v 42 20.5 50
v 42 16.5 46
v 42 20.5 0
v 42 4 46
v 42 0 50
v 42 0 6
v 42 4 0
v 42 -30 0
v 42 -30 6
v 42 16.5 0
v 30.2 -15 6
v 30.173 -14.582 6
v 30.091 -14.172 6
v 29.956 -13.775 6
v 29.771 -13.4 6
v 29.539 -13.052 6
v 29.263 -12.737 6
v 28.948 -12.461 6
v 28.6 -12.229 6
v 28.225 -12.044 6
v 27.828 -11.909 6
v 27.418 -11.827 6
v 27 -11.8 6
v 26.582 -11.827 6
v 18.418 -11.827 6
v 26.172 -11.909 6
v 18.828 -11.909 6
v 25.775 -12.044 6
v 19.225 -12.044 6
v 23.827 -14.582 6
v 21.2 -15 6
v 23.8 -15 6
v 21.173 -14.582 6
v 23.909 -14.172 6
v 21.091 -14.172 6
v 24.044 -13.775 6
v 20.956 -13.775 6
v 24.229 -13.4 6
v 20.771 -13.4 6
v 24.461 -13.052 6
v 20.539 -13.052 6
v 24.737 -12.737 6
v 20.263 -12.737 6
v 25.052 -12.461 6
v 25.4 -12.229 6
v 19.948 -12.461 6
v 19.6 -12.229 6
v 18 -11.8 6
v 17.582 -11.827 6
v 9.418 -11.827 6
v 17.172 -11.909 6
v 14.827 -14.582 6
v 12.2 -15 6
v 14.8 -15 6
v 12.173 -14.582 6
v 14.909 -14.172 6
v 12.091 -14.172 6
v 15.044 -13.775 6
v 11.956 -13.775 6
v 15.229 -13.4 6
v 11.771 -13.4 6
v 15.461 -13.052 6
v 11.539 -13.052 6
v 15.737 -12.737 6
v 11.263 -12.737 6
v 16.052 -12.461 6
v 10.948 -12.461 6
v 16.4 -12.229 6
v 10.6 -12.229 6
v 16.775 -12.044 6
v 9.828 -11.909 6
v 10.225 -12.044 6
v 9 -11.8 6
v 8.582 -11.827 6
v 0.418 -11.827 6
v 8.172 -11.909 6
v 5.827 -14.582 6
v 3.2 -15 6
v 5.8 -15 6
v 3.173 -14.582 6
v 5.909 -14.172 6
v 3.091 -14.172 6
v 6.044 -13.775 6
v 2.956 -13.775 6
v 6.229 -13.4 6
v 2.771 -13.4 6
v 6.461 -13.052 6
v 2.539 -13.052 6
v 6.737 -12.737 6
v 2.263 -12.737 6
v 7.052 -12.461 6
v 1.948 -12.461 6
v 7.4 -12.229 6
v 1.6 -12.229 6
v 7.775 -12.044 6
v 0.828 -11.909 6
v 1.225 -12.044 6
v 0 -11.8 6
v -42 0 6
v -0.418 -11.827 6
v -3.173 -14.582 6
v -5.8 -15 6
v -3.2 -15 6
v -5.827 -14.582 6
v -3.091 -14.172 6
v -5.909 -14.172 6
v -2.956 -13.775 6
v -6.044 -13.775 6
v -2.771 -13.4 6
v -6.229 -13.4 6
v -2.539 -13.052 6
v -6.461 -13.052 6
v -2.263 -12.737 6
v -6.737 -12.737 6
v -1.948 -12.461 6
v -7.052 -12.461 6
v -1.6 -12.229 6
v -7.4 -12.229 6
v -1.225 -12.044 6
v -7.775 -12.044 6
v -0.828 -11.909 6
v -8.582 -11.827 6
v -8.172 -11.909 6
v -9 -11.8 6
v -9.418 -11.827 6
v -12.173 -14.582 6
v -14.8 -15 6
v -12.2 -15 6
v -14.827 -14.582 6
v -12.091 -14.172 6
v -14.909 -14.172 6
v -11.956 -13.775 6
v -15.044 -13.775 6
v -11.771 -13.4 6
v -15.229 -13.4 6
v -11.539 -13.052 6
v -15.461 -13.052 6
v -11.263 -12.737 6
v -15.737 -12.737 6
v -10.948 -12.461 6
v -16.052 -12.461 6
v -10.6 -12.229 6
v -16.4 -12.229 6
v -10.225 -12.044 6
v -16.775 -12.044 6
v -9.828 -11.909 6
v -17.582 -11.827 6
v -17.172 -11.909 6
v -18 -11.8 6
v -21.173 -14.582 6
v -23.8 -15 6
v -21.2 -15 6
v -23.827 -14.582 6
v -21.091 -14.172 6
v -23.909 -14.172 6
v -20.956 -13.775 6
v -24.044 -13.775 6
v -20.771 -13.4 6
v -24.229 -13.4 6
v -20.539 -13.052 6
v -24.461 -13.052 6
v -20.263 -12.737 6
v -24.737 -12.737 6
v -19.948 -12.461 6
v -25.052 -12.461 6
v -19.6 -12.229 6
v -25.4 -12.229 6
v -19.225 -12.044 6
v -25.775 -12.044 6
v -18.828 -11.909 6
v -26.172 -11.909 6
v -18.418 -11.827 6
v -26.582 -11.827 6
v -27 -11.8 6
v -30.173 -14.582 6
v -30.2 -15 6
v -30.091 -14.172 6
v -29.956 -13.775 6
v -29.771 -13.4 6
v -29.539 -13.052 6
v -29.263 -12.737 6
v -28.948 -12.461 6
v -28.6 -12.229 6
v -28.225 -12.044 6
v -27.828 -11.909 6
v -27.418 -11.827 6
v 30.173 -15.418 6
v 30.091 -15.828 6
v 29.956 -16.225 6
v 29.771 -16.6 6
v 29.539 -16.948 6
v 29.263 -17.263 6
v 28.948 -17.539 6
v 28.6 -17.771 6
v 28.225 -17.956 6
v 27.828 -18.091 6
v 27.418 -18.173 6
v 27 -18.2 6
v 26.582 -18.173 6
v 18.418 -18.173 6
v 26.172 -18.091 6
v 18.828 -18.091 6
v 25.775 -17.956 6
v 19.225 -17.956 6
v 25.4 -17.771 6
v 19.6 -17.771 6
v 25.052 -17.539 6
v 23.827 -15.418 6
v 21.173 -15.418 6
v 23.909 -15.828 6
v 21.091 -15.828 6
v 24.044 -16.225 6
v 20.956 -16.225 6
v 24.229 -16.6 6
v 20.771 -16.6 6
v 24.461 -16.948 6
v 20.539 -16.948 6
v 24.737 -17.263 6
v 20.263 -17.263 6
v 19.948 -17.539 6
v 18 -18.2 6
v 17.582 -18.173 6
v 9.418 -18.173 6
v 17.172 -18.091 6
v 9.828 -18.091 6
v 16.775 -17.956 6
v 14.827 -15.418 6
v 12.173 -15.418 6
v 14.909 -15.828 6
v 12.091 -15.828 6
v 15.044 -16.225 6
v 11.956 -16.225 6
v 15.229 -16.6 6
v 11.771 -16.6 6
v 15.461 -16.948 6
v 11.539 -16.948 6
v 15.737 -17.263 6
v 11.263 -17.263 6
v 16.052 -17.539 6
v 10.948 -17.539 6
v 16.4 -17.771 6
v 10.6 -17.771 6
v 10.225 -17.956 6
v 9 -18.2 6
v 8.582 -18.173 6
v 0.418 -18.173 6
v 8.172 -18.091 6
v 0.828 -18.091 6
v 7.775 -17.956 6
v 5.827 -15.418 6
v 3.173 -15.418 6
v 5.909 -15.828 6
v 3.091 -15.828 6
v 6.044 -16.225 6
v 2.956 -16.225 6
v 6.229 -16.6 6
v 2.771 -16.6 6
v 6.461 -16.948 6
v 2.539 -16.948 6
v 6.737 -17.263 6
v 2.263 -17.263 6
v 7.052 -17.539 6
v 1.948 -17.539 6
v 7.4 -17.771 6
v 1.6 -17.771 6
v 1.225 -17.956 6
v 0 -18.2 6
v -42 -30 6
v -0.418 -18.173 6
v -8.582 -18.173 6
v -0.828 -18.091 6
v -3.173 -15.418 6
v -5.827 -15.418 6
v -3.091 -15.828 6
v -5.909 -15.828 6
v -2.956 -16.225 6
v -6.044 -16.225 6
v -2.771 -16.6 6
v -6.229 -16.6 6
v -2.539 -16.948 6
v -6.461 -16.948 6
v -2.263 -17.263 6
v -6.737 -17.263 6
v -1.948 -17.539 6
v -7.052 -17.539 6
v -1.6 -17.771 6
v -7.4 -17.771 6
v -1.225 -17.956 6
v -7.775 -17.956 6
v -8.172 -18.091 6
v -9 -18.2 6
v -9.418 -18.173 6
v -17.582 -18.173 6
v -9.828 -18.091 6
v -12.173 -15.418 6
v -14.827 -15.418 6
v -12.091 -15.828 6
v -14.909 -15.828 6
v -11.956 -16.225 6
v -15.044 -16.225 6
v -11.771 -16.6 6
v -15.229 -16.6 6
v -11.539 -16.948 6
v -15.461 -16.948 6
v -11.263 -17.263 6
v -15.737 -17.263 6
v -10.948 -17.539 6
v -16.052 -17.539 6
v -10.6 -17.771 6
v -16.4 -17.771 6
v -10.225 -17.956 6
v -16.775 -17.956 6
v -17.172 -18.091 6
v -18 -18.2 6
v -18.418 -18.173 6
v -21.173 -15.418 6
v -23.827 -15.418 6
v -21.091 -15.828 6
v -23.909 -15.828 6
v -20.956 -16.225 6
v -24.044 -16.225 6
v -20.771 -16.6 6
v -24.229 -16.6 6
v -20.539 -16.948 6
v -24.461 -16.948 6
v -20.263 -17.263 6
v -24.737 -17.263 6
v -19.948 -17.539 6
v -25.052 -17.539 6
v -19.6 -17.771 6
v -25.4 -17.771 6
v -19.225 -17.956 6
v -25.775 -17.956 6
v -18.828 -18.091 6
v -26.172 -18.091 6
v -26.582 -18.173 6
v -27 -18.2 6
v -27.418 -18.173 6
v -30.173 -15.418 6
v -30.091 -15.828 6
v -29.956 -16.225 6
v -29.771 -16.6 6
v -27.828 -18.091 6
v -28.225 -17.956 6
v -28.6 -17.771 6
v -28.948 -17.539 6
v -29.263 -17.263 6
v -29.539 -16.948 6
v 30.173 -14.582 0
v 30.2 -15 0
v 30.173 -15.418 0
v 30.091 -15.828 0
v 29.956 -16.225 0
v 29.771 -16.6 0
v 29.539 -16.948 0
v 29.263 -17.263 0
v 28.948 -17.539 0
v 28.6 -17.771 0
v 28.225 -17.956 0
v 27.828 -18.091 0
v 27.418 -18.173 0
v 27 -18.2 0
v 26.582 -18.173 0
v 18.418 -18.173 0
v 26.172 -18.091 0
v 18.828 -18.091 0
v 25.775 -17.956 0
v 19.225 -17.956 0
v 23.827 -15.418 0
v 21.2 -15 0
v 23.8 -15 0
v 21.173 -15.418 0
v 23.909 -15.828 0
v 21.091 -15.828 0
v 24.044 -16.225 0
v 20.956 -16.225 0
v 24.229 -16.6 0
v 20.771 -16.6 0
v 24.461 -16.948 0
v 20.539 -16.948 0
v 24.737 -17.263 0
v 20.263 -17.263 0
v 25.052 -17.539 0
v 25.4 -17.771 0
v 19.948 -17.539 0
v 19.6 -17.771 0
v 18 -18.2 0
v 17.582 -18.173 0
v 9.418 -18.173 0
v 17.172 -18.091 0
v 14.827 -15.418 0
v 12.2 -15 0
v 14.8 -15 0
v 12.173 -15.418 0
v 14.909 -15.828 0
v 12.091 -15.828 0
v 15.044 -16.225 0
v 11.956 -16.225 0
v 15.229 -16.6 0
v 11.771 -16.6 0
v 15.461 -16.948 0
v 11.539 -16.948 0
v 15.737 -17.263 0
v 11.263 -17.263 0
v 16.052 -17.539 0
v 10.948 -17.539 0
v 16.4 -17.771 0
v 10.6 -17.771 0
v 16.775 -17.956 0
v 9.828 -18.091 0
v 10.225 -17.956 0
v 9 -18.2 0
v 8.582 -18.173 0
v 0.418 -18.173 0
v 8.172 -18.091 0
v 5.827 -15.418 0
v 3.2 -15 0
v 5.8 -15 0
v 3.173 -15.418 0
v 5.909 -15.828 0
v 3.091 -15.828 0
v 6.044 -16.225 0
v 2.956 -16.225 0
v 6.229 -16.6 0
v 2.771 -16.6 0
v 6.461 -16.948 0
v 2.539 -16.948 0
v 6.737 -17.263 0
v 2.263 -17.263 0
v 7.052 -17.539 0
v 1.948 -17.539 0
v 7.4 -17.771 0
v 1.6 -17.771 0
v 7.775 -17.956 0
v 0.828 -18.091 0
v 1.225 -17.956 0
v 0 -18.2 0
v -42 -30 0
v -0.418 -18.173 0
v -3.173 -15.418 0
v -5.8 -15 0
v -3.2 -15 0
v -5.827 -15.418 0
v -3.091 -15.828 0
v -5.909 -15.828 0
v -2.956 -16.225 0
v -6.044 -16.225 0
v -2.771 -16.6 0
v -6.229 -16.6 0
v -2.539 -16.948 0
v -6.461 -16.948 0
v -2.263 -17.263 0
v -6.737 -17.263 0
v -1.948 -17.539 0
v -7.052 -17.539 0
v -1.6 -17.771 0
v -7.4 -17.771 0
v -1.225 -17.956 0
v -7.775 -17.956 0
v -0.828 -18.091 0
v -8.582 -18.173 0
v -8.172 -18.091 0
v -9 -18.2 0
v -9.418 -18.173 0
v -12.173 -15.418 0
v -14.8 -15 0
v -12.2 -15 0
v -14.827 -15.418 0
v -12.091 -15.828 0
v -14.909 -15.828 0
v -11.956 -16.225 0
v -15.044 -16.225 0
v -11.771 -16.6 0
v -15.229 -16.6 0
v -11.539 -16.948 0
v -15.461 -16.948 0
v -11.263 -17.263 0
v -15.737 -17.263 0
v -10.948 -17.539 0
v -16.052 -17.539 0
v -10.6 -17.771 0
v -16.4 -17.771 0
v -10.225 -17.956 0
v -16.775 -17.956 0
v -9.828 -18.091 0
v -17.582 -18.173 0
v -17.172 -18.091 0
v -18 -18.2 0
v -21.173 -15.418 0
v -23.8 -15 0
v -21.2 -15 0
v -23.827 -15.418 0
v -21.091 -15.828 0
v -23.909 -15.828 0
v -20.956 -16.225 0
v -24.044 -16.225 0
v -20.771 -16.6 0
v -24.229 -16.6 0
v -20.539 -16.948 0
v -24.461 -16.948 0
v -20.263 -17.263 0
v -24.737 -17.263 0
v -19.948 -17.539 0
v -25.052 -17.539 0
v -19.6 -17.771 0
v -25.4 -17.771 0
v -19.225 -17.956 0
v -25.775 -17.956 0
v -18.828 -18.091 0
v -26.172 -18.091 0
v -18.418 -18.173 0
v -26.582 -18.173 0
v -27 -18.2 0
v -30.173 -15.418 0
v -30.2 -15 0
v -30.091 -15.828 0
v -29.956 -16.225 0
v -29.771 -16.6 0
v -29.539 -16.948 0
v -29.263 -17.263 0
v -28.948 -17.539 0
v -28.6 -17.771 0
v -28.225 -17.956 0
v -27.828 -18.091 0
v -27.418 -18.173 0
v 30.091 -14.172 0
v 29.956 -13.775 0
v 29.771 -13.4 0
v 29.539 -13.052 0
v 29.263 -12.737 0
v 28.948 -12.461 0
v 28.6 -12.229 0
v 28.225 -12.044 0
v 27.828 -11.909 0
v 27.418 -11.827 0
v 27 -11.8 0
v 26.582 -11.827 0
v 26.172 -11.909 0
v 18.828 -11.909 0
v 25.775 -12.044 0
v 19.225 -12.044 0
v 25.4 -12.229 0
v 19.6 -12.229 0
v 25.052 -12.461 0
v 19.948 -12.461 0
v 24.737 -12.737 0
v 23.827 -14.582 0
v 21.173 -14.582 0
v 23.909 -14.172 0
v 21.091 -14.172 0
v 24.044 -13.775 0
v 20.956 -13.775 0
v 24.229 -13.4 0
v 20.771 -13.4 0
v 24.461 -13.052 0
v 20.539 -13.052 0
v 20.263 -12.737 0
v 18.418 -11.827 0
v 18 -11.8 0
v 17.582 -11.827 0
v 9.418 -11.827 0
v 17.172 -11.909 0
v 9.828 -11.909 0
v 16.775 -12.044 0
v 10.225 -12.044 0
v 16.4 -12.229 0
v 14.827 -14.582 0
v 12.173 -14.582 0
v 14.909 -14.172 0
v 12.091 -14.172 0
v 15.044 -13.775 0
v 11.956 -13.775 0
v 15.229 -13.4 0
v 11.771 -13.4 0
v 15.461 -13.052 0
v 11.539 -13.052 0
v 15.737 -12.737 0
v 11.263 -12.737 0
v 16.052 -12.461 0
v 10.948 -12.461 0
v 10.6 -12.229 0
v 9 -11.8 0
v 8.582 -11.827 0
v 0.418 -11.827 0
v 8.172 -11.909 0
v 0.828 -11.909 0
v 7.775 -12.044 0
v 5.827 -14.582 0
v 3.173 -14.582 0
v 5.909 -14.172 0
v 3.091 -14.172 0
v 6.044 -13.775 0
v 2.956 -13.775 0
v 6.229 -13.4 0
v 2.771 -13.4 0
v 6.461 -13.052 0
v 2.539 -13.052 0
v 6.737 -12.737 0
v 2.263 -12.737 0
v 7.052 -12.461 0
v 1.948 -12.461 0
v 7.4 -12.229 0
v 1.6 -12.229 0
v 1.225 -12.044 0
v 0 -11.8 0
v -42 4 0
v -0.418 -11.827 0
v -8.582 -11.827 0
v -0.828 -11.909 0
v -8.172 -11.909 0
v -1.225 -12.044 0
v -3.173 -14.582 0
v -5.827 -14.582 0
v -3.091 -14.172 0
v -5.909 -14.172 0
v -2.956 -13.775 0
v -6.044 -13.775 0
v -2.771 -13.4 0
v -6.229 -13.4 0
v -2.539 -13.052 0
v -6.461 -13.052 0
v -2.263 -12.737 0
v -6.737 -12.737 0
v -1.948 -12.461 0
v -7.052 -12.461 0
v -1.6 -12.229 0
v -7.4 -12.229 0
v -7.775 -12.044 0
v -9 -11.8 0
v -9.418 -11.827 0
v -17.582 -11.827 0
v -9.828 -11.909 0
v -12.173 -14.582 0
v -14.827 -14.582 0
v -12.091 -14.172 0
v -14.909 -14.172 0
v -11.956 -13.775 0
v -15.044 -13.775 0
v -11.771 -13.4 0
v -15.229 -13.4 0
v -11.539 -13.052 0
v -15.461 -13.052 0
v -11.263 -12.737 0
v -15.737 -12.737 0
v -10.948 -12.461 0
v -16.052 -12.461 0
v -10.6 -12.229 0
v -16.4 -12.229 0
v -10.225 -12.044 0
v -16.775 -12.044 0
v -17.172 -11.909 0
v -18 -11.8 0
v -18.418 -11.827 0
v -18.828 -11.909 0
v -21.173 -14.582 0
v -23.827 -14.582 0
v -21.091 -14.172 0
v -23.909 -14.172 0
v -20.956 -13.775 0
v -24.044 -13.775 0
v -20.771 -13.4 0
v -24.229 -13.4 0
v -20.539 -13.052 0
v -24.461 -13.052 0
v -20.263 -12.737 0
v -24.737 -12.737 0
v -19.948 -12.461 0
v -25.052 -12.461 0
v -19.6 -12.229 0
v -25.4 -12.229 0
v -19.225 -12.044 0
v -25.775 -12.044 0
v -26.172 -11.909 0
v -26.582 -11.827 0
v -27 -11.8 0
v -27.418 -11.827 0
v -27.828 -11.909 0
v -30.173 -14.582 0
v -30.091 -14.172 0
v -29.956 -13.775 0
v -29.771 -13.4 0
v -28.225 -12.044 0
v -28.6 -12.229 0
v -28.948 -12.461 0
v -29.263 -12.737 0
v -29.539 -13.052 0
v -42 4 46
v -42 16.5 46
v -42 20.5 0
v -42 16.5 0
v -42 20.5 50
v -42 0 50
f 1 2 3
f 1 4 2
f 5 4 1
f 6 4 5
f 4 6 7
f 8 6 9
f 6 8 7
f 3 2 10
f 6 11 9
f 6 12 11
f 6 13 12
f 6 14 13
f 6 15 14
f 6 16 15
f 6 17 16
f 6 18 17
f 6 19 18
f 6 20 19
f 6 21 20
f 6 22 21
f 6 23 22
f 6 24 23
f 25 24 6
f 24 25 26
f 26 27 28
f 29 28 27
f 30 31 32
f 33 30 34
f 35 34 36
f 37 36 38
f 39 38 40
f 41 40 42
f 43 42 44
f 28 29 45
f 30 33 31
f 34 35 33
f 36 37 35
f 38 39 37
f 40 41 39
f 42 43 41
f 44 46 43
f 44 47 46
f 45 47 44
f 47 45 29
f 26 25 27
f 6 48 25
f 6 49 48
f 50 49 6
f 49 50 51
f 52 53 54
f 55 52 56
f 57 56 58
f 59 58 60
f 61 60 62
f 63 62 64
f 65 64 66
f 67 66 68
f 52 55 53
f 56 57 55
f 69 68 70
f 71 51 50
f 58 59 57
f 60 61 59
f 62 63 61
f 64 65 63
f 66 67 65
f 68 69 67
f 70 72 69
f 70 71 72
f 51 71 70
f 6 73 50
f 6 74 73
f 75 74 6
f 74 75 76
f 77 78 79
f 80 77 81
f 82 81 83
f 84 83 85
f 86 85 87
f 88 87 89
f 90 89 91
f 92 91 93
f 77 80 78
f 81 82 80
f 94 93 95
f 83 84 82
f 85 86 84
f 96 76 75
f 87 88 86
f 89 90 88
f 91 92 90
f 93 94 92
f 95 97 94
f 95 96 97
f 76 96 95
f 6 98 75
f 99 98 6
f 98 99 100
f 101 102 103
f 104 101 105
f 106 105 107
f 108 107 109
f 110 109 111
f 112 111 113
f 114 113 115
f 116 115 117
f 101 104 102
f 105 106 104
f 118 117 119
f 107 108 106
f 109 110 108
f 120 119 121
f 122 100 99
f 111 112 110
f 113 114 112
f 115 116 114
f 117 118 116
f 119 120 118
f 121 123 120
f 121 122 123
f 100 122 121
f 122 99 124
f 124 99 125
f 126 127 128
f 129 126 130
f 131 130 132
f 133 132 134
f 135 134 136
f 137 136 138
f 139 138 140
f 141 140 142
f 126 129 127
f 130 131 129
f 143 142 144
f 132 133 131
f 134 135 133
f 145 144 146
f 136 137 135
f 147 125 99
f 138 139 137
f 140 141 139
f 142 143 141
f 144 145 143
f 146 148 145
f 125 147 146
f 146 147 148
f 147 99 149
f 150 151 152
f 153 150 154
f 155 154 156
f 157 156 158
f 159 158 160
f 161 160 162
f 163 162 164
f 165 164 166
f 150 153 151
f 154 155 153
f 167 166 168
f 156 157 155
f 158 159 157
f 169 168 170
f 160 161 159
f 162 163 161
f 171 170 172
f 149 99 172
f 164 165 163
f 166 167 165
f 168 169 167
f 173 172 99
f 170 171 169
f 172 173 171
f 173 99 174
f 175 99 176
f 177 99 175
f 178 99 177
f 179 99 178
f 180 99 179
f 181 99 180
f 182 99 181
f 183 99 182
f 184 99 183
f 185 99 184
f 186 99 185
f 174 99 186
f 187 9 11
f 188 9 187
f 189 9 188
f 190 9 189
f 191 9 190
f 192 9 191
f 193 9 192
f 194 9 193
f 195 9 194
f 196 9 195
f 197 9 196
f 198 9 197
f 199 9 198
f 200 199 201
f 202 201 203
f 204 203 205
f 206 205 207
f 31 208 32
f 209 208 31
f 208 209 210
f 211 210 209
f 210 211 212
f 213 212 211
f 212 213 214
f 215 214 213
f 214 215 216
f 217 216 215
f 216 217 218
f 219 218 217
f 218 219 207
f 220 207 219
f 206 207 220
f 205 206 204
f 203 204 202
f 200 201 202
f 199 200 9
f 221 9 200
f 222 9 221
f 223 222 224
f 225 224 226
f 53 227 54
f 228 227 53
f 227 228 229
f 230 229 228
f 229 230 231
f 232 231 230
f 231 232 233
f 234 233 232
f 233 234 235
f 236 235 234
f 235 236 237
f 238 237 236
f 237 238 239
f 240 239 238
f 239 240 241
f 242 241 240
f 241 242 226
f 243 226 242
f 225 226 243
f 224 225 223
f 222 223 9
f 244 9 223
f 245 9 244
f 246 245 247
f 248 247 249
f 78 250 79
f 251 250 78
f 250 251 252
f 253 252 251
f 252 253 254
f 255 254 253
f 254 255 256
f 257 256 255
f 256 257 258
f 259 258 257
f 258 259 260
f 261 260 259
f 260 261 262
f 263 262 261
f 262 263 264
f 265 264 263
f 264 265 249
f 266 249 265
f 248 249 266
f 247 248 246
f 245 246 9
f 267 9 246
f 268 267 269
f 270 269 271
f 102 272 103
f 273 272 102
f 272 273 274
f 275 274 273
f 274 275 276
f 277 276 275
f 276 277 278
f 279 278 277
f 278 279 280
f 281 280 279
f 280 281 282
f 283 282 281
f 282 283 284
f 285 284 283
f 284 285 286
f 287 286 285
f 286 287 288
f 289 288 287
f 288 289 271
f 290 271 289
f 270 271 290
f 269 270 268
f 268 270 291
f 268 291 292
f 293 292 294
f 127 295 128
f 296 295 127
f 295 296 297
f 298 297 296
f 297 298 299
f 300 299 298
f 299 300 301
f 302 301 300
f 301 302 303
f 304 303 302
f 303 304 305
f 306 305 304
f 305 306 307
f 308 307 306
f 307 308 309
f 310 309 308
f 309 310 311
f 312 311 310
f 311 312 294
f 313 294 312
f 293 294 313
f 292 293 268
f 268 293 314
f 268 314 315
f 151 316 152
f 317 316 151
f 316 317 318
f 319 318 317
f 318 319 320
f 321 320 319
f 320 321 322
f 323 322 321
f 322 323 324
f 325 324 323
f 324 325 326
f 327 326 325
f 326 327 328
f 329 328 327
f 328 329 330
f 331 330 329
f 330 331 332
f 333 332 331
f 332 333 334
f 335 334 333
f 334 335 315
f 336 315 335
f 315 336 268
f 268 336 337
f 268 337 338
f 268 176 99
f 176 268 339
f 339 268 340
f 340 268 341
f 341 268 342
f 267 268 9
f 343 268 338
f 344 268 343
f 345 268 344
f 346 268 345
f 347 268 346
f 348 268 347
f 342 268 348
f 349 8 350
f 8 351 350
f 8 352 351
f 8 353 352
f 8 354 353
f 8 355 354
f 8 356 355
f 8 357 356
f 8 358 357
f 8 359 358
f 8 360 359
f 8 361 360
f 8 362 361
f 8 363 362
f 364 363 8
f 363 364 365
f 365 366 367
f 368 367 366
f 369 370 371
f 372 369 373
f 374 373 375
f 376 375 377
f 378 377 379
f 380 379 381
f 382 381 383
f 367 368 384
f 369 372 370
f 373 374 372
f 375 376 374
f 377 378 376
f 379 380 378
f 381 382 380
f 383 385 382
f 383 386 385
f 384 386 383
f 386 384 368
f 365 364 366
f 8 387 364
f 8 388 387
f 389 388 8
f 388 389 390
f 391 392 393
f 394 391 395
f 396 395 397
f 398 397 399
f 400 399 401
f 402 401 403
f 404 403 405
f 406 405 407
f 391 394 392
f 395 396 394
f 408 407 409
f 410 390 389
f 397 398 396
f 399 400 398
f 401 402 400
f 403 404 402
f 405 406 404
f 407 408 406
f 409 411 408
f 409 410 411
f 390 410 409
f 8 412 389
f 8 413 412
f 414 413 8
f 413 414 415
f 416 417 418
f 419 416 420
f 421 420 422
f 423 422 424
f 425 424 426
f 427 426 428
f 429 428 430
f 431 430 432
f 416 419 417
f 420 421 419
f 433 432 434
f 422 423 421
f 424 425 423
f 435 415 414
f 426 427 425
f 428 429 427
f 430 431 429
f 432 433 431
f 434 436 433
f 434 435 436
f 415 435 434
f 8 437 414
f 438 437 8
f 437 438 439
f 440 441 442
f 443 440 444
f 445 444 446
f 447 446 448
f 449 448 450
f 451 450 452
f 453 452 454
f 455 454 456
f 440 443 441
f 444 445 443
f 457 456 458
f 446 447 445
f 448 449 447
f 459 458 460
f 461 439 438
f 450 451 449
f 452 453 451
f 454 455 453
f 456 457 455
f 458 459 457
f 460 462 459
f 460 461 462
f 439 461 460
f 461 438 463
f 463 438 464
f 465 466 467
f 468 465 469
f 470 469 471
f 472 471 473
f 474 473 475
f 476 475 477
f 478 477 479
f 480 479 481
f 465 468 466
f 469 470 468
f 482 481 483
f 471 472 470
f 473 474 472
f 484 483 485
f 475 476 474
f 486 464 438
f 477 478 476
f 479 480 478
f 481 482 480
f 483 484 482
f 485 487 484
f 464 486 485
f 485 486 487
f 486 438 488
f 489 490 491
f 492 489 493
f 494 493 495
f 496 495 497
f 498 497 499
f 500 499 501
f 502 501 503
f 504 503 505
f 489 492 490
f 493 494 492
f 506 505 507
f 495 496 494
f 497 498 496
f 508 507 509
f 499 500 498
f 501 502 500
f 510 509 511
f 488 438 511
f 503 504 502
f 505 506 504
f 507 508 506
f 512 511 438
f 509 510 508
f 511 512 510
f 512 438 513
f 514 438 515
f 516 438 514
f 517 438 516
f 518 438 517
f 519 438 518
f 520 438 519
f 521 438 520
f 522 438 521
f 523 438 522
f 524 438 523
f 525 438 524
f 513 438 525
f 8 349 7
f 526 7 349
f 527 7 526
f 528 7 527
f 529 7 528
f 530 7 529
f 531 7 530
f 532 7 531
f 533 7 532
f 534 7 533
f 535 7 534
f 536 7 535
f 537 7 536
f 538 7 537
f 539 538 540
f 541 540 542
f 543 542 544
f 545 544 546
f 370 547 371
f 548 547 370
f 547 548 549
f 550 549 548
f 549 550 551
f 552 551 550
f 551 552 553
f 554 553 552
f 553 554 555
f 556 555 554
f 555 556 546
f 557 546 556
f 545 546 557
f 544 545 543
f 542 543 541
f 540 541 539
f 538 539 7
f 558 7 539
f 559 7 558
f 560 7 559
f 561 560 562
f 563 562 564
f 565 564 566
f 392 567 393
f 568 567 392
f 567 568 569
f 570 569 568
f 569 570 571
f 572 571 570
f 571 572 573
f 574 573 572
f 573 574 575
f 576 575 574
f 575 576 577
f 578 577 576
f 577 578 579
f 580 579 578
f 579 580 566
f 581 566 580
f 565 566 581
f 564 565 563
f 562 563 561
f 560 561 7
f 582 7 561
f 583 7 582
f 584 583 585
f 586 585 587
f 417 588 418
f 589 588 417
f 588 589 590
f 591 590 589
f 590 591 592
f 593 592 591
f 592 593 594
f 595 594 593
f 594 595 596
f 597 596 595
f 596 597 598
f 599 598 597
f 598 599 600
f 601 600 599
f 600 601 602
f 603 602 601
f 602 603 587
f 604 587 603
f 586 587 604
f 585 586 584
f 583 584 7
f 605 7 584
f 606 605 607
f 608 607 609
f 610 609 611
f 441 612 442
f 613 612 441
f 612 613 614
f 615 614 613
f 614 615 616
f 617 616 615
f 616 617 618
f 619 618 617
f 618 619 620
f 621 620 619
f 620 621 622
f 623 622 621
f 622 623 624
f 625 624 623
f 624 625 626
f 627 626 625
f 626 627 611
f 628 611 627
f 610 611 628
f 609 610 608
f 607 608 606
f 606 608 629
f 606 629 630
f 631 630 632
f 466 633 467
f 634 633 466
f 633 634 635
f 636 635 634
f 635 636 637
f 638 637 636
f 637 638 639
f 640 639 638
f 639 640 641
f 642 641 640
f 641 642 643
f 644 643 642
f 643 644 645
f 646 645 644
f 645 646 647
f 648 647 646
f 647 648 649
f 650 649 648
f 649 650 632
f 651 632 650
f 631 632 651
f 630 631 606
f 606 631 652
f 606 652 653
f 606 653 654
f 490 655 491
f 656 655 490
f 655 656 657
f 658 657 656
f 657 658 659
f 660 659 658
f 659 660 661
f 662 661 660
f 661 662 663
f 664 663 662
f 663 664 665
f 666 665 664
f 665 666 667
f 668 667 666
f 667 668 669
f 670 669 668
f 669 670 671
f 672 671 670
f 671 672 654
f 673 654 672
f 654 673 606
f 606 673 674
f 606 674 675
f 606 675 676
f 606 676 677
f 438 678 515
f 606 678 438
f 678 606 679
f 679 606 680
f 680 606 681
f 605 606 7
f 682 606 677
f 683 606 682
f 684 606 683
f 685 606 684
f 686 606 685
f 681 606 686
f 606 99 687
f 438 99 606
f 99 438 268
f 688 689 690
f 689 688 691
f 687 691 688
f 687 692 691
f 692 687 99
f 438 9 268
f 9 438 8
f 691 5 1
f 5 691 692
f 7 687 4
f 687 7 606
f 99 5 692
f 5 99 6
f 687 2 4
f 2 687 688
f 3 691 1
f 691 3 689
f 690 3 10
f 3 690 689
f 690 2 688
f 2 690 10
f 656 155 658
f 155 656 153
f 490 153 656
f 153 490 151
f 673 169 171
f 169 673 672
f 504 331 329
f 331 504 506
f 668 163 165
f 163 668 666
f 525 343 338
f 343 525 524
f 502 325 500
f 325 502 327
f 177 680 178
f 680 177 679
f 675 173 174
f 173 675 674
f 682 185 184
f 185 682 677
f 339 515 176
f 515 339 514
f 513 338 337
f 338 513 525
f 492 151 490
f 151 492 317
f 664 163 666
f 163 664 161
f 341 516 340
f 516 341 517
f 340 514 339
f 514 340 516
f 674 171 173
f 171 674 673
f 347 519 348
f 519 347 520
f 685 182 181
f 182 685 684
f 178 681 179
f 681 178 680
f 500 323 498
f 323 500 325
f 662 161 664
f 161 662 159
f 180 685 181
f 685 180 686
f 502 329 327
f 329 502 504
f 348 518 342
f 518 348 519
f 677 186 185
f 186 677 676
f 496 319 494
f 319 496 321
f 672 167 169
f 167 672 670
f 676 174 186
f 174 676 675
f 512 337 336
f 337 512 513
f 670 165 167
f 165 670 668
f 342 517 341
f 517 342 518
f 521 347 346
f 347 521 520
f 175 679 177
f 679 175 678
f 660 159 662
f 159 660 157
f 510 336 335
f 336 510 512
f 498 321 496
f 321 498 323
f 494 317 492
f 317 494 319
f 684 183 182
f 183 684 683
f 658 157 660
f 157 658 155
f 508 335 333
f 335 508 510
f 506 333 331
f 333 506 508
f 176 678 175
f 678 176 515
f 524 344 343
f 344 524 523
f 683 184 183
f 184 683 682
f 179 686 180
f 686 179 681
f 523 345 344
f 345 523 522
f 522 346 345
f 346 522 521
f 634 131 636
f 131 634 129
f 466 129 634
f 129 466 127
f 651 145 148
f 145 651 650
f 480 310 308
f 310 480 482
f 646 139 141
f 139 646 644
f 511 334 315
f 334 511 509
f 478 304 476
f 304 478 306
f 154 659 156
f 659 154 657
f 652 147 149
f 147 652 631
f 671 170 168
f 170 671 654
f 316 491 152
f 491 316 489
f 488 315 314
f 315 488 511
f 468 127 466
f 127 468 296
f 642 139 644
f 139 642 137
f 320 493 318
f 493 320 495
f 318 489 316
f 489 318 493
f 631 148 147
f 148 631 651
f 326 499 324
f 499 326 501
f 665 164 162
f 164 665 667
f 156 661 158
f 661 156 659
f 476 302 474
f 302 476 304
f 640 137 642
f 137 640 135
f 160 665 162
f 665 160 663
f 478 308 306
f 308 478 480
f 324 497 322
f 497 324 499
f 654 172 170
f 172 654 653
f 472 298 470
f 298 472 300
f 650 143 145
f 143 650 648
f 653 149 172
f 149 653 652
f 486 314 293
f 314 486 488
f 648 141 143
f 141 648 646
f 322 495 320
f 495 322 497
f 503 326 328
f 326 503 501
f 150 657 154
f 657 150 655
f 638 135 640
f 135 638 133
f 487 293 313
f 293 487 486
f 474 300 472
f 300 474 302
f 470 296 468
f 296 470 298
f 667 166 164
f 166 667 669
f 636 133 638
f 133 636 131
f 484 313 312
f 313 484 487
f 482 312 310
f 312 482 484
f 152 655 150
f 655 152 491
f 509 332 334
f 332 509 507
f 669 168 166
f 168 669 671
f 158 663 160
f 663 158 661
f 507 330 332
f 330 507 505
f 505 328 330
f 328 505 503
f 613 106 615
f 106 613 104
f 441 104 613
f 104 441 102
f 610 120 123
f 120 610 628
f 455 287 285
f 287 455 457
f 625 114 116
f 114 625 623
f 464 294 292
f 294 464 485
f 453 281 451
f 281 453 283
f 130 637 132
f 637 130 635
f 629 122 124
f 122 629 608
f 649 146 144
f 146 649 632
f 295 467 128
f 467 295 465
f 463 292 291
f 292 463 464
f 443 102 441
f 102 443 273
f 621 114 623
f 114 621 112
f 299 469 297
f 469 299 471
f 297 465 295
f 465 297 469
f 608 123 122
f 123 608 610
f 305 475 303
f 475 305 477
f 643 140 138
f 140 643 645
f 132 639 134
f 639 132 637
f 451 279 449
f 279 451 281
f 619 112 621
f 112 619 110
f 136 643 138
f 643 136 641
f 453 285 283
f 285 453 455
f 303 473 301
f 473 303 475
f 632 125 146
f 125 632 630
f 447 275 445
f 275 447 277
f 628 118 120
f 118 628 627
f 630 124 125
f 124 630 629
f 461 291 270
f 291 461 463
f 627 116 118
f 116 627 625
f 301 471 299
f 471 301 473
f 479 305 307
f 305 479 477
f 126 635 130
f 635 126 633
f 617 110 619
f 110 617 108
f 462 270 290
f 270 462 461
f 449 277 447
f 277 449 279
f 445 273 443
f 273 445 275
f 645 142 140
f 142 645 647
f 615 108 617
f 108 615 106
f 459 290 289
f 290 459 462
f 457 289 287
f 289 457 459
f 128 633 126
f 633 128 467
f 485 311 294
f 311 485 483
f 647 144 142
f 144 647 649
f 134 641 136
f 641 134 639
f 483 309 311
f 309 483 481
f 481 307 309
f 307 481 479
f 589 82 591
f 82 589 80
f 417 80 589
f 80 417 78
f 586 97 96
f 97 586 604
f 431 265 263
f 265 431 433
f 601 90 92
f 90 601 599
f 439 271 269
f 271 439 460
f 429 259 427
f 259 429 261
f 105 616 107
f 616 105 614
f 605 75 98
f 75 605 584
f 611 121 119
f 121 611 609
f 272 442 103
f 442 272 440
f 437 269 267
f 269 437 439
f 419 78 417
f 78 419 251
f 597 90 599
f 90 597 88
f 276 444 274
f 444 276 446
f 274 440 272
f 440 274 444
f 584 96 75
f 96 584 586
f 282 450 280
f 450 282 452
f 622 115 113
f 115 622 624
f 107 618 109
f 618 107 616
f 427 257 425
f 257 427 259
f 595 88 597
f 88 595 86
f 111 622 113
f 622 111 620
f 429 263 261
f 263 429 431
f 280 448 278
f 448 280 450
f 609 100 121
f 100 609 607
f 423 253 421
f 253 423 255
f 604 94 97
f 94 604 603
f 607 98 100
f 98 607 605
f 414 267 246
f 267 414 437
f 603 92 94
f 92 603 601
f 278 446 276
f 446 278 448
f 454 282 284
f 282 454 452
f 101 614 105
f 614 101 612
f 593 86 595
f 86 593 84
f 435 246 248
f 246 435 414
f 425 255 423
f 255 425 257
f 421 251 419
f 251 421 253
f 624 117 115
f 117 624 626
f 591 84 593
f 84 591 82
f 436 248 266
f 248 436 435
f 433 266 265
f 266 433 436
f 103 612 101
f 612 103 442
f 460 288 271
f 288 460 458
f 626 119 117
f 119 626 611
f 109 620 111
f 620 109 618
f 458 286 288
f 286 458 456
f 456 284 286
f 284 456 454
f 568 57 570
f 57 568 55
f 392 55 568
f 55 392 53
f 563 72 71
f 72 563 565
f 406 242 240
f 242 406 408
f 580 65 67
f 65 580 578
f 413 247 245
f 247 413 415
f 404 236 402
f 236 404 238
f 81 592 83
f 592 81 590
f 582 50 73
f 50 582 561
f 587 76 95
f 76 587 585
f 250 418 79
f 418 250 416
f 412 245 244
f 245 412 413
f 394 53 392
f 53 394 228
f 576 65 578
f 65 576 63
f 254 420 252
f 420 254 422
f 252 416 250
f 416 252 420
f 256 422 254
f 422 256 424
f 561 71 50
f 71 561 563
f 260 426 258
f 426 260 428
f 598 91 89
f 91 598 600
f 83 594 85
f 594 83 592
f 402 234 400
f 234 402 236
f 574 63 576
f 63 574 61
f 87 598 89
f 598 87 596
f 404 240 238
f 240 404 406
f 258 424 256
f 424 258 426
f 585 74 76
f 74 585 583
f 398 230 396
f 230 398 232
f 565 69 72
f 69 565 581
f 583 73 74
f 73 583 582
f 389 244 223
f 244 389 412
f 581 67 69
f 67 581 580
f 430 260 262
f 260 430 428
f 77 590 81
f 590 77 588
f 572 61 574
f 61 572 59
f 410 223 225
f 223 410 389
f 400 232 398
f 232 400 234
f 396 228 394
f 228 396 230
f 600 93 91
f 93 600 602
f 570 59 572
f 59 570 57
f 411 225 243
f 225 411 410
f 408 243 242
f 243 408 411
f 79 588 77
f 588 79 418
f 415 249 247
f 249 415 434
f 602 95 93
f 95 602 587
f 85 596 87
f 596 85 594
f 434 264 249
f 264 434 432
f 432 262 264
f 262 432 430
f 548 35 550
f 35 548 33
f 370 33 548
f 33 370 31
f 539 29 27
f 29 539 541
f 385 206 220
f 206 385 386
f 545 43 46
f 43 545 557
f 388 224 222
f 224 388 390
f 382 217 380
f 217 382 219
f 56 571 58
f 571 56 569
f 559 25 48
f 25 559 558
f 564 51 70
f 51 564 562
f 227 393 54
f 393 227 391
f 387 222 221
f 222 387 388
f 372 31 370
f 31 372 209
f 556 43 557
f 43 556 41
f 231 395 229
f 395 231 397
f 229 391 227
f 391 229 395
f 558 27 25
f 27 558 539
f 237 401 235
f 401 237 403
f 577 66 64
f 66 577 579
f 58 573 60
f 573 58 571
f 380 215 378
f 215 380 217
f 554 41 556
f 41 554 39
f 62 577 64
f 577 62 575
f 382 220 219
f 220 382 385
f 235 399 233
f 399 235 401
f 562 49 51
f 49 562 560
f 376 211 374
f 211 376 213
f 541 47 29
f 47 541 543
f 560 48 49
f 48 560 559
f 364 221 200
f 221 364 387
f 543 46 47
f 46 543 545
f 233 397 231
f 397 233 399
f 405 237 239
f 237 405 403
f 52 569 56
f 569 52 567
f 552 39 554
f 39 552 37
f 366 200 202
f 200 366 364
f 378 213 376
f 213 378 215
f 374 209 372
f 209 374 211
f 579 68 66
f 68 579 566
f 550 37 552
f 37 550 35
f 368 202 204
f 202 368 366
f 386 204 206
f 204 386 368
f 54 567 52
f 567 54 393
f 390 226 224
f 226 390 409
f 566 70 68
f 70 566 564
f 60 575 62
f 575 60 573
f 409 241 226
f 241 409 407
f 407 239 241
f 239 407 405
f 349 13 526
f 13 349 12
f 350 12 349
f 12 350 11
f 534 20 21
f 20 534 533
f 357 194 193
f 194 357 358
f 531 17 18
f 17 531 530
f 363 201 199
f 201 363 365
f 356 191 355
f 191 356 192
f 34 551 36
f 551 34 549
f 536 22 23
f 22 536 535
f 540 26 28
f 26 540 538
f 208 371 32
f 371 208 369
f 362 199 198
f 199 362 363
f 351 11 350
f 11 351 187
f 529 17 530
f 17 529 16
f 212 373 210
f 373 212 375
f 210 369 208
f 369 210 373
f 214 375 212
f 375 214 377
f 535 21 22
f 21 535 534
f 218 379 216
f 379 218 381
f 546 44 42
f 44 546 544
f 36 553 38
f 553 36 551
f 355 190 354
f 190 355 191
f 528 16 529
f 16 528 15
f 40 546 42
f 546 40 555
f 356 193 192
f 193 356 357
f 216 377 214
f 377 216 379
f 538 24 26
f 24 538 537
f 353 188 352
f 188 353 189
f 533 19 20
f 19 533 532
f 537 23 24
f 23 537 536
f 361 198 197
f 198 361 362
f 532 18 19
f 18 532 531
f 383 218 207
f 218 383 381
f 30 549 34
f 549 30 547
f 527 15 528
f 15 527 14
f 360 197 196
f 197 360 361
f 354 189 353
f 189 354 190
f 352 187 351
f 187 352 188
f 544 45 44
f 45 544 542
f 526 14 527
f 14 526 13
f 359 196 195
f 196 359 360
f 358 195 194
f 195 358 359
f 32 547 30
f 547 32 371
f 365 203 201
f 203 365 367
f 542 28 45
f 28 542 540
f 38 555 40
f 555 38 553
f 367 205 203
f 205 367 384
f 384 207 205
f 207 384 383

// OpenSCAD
// KNOWN-WRONG PART (must fail): seven holes instead of eight
// Holder that hangs one 8-tube PCR strip inside an ice bucket, hooked over its 12 mm wall
// Category: quick fixes. An upside-down U (two legs and a bridge) that fits over the wall, and a
// ledge at the foot of the inner leg with eight tube holes, so the tubes sit down in the ice.
// Print: PLA or PETG, as used (both legs and the ledge on the bed); the bridge spans 12.5 mm.
// SPDX-License-Identifier: CERN-OHL-P-2.0

/* [Hanger] */
length = 84;              // along X, centred
leg_t = 4;
gap = 12.5;               // 12 mm bucket wall + clearance
leg_h = 50;               // both legs from z = 0 to 50
bridge_t = 4;             // bridge from z = 46 to 50
ledge = [30, 6];          // ledge reaches 30 mm toward -Y, 6 mm thick
hole_d = 6.4;
n = 7;
pitch = 9;
hole_y = -15;

/* [Hidden] */
eps = 0.01;
outer_y = leg_t + gap;    // outer leg from y = 16.5 to 20.5

difference() {
    union() {
        translate([-length / 2, -ledge[0], 0]) cube([length, ledge[0] + eps, ledge[1]]);
        translate([-length / 2, 0, 0]) cube([length, leg_t, leg_h]);
        translate([-length / 2, 0, leg_h - bridge_t]) cube([length, outer_y + leg_t, bridge_t]);
        translate([-length / 2, outer_y, 0]) cube([length, leg_t, leg_h]);
    }
    for (i = [0 : n - 1])
        translate([(i - (n - 1) / 2) * pitch, hole_y, -1]) cylinder(d = hole_d, h = ledge[1] + 2, $fn = 48);
}
